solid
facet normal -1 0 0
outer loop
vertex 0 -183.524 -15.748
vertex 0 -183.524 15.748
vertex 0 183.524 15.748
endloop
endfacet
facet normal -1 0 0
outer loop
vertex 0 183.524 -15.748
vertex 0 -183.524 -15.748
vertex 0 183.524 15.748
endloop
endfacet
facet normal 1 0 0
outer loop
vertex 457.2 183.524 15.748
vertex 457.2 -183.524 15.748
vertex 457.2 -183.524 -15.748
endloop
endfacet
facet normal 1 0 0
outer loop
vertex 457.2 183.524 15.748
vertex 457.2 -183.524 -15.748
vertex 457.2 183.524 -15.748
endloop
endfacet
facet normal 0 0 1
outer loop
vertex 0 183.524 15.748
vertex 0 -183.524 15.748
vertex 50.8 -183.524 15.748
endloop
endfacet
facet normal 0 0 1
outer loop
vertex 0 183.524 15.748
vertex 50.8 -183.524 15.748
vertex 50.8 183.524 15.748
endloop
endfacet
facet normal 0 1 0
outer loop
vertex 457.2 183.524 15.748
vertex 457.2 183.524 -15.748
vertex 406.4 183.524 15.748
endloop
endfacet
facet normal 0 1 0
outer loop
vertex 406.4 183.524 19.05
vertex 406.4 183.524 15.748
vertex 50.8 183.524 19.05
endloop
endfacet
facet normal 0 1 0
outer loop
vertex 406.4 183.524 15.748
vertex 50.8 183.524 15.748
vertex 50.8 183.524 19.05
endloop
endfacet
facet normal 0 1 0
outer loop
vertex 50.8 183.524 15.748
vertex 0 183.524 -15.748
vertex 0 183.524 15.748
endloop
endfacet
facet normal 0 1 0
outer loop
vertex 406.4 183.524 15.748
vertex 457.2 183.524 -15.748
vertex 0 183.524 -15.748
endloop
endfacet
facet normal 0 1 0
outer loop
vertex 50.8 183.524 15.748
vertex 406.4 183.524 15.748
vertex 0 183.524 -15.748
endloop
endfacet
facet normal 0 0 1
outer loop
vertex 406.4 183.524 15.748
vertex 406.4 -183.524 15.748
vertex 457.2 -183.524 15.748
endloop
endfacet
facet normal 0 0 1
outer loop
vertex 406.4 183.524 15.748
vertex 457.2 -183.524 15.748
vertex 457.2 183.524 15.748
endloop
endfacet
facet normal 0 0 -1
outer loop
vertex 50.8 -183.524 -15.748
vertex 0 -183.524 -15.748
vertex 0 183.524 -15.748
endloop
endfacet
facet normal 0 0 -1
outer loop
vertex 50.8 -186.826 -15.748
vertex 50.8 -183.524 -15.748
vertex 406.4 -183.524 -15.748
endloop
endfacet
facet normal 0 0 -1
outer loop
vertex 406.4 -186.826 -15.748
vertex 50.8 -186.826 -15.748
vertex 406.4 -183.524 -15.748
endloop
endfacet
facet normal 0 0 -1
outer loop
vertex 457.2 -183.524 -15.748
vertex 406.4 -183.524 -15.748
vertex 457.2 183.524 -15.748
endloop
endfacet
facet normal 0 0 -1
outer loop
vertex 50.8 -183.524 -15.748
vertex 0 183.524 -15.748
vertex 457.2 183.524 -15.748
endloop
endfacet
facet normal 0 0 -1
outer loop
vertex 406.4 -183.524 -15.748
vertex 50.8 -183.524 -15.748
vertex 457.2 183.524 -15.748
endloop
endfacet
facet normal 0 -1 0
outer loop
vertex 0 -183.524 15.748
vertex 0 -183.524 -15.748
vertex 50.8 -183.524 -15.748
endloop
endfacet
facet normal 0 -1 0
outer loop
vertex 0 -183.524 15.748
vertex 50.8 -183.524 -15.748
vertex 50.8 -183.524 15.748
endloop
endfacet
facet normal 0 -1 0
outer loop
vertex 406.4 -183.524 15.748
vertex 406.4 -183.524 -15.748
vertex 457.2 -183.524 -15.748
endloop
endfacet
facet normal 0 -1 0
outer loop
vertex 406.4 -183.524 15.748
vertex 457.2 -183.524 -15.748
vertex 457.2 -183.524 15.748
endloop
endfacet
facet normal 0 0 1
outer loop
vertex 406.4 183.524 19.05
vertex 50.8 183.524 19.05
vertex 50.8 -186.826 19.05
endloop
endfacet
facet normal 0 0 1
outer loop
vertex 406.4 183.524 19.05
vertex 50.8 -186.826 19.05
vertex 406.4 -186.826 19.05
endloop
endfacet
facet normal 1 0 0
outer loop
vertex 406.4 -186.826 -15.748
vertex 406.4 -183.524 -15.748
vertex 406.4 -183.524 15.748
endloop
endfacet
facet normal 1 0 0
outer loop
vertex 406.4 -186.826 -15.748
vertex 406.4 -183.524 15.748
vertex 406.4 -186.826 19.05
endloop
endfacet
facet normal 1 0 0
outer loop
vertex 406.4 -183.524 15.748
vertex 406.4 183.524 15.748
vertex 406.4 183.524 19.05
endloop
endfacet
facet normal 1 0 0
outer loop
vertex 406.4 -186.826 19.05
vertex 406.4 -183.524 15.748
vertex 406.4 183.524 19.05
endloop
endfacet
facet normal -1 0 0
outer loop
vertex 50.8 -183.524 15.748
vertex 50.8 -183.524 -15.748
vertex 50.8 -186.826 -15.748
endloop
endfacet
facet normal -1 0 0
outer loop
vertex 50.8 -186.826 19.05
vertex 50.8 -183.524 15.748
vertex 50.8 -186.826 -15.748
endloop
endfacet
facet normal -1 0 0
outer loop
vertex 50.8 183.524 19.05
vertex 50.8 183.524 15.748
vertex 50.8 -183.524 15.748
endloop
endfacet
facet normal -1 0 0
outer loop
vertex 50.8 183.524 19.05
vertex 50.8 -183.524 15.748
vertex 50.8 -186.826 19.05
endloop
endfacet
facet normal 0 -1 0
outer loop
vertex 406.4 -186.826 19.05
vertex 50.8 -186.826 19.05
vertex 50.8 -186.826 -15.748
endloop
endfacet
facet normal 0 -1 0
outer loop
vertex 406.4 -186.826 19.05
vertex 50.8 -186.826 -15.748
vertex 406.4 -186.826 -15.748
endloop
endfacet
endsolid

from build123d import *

# Parameters (mm, degrees)
F0_W     = 367.04778
F0_H     = 31.496
F1_DEPTH = 457.2
F2_W     = 355.6
F2_H     = 367.04778
F3_DEPTH = 3.302
F4_W     = 355.6
F4_H     = 34.798
F5_DEPTH = 3.302


with BuildPart() as f1:
    # F0 (on Right) → F1 (new body)
    with BuildSketch(Plane.YZ):
        Rectangle(F0_W, F0_H)
    extrude(amount=F1_DEPTH)

    # F2 (on face) → F3 (join)
    with BuildSketch(Plane.XY.offset(15.748)):
        with Locations((228.6, 0)):
            Rectangle(F2_W, F2_H)
    extrude(amount=F3_DEPTH)

    # F4 (on face) → F5 (join)
    with BuildSketch(Plane.XZ.offset(183.52389)):
        with Locations((228.6, 1.651)):
            Rectangle(F4_W, F4_H)
    extrude(amount=F5_DEPTH)


solid = f1.part
